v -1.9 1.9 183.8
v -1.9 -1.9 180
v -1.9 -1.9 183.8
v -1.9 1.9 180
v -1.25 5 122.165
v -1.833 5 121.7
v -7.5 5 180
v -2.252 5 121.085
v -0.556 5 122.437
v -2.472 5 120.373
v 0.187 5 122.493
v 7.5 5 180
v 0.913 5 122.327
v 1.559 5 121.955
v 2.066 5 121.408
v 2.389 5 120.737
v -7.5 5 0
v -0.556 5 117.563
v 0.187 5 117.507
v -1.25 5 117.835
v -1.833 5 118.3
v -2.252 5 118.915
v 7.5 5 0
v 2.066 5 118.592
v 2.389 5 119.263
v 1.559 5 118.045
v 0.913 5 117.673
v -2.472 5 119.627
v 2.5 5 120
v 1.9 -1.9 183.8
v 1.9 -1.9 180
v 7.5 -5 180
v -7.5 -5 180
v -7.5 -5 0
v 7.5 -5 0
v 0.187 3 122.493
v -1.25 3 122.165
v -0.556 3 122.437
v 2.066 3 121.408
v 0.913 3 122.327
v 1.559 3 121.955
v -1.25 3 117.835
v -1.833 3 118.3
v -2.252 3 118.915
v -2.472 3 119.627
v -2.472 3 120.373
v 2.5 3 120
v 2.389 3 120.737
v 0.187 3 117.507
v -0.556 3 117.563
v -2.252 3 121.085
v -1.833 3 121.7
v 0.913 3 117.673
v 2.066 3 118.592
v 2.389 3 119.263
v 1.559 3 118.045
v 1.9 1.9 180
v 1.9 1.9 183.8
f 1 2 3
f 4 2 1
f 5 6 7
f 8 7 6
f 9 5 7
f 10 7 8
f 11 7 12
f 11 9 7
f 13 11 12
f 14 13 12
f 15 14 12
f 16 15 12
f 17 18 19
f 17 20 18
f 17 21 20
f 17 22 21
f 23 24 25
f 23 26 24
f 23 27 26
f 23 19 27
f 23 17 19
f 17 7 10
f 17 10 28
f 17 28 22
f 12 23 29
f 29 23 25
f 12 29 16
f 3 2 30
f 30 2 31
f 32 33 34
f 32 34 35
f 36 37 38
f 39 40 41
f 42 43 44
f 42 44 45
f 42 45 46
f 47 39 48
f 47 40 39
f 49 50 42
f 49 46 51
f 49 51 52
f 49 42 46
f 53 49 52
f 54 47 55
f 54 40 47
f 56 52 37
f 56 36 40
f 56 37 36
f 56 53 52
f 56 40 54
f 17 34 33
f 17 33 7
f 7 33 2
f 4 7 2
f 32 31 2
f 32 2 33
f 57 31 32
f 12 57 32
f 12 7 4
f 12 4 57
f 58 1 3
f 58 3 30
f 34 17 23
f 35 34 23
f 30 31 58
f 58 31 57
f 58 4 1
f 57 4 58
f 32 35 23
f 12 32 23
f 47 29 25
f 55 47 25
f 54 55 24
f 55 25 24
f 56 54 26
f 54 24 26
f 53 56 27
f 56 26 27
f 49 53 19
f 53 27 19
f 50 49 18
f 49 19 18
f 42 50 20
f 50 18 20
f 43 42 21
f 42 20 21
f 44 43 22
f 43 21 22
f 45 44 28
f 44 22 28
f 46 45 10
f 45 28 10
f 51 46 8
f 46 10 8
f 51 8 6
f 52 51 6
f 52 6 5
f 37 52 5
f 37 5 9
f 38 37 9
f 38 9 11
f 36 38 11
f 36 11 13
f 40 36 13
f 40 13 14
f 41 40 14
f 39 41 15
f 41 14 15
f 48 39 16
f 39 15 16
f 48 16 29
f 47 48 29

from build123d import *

# Parameters (mm, degrees)
SKETCH1_W           = 15
SKETCH1_H           = 10
BOSS_EXTRUDE1_DEPTH = 180
SKETCH2_W           = 3.8
SKETCH2_H           = 3.8
BOSS_EXTRUDE2_DEPTH = 3.8
SKETCH3_R           = 2.5
CUT_EXTRUDE1_DEPTH  = 2


with BuildPart() as part:
    # Sketch1 → Boss-Extrude1 (new body)
    with BuildSketch(Plane.XY):
        Rectangle(SKETCH1_W, SKETCH1_H)
    extrude(amount=BOSS_EXTRUDE1_DEPTH)

    # Sketch2 → Boss-Extrude2 (add)
    with BuildSketch(Plane.XY.offset(180)):
        Rectangle(SKETCH2_W, SKETCH2_H)
    extrude(amount=BOSS_EXTRUDE2_DEPTH)

    # Sketch3 → Cut-Extrude1 (cut)
    with BuildSketch(Plane(origin=(0, 5, 0), x_dir=(1, 0, 0), z_dir=(0, 1, 0))):
        with Locations((0, -120)):
            Circle(SKETCH3_R)
    extrude(amount=-CUT_EXTRUDE1_DEPTH, mode=Mode.SUBTRACT)


solid = part.part
